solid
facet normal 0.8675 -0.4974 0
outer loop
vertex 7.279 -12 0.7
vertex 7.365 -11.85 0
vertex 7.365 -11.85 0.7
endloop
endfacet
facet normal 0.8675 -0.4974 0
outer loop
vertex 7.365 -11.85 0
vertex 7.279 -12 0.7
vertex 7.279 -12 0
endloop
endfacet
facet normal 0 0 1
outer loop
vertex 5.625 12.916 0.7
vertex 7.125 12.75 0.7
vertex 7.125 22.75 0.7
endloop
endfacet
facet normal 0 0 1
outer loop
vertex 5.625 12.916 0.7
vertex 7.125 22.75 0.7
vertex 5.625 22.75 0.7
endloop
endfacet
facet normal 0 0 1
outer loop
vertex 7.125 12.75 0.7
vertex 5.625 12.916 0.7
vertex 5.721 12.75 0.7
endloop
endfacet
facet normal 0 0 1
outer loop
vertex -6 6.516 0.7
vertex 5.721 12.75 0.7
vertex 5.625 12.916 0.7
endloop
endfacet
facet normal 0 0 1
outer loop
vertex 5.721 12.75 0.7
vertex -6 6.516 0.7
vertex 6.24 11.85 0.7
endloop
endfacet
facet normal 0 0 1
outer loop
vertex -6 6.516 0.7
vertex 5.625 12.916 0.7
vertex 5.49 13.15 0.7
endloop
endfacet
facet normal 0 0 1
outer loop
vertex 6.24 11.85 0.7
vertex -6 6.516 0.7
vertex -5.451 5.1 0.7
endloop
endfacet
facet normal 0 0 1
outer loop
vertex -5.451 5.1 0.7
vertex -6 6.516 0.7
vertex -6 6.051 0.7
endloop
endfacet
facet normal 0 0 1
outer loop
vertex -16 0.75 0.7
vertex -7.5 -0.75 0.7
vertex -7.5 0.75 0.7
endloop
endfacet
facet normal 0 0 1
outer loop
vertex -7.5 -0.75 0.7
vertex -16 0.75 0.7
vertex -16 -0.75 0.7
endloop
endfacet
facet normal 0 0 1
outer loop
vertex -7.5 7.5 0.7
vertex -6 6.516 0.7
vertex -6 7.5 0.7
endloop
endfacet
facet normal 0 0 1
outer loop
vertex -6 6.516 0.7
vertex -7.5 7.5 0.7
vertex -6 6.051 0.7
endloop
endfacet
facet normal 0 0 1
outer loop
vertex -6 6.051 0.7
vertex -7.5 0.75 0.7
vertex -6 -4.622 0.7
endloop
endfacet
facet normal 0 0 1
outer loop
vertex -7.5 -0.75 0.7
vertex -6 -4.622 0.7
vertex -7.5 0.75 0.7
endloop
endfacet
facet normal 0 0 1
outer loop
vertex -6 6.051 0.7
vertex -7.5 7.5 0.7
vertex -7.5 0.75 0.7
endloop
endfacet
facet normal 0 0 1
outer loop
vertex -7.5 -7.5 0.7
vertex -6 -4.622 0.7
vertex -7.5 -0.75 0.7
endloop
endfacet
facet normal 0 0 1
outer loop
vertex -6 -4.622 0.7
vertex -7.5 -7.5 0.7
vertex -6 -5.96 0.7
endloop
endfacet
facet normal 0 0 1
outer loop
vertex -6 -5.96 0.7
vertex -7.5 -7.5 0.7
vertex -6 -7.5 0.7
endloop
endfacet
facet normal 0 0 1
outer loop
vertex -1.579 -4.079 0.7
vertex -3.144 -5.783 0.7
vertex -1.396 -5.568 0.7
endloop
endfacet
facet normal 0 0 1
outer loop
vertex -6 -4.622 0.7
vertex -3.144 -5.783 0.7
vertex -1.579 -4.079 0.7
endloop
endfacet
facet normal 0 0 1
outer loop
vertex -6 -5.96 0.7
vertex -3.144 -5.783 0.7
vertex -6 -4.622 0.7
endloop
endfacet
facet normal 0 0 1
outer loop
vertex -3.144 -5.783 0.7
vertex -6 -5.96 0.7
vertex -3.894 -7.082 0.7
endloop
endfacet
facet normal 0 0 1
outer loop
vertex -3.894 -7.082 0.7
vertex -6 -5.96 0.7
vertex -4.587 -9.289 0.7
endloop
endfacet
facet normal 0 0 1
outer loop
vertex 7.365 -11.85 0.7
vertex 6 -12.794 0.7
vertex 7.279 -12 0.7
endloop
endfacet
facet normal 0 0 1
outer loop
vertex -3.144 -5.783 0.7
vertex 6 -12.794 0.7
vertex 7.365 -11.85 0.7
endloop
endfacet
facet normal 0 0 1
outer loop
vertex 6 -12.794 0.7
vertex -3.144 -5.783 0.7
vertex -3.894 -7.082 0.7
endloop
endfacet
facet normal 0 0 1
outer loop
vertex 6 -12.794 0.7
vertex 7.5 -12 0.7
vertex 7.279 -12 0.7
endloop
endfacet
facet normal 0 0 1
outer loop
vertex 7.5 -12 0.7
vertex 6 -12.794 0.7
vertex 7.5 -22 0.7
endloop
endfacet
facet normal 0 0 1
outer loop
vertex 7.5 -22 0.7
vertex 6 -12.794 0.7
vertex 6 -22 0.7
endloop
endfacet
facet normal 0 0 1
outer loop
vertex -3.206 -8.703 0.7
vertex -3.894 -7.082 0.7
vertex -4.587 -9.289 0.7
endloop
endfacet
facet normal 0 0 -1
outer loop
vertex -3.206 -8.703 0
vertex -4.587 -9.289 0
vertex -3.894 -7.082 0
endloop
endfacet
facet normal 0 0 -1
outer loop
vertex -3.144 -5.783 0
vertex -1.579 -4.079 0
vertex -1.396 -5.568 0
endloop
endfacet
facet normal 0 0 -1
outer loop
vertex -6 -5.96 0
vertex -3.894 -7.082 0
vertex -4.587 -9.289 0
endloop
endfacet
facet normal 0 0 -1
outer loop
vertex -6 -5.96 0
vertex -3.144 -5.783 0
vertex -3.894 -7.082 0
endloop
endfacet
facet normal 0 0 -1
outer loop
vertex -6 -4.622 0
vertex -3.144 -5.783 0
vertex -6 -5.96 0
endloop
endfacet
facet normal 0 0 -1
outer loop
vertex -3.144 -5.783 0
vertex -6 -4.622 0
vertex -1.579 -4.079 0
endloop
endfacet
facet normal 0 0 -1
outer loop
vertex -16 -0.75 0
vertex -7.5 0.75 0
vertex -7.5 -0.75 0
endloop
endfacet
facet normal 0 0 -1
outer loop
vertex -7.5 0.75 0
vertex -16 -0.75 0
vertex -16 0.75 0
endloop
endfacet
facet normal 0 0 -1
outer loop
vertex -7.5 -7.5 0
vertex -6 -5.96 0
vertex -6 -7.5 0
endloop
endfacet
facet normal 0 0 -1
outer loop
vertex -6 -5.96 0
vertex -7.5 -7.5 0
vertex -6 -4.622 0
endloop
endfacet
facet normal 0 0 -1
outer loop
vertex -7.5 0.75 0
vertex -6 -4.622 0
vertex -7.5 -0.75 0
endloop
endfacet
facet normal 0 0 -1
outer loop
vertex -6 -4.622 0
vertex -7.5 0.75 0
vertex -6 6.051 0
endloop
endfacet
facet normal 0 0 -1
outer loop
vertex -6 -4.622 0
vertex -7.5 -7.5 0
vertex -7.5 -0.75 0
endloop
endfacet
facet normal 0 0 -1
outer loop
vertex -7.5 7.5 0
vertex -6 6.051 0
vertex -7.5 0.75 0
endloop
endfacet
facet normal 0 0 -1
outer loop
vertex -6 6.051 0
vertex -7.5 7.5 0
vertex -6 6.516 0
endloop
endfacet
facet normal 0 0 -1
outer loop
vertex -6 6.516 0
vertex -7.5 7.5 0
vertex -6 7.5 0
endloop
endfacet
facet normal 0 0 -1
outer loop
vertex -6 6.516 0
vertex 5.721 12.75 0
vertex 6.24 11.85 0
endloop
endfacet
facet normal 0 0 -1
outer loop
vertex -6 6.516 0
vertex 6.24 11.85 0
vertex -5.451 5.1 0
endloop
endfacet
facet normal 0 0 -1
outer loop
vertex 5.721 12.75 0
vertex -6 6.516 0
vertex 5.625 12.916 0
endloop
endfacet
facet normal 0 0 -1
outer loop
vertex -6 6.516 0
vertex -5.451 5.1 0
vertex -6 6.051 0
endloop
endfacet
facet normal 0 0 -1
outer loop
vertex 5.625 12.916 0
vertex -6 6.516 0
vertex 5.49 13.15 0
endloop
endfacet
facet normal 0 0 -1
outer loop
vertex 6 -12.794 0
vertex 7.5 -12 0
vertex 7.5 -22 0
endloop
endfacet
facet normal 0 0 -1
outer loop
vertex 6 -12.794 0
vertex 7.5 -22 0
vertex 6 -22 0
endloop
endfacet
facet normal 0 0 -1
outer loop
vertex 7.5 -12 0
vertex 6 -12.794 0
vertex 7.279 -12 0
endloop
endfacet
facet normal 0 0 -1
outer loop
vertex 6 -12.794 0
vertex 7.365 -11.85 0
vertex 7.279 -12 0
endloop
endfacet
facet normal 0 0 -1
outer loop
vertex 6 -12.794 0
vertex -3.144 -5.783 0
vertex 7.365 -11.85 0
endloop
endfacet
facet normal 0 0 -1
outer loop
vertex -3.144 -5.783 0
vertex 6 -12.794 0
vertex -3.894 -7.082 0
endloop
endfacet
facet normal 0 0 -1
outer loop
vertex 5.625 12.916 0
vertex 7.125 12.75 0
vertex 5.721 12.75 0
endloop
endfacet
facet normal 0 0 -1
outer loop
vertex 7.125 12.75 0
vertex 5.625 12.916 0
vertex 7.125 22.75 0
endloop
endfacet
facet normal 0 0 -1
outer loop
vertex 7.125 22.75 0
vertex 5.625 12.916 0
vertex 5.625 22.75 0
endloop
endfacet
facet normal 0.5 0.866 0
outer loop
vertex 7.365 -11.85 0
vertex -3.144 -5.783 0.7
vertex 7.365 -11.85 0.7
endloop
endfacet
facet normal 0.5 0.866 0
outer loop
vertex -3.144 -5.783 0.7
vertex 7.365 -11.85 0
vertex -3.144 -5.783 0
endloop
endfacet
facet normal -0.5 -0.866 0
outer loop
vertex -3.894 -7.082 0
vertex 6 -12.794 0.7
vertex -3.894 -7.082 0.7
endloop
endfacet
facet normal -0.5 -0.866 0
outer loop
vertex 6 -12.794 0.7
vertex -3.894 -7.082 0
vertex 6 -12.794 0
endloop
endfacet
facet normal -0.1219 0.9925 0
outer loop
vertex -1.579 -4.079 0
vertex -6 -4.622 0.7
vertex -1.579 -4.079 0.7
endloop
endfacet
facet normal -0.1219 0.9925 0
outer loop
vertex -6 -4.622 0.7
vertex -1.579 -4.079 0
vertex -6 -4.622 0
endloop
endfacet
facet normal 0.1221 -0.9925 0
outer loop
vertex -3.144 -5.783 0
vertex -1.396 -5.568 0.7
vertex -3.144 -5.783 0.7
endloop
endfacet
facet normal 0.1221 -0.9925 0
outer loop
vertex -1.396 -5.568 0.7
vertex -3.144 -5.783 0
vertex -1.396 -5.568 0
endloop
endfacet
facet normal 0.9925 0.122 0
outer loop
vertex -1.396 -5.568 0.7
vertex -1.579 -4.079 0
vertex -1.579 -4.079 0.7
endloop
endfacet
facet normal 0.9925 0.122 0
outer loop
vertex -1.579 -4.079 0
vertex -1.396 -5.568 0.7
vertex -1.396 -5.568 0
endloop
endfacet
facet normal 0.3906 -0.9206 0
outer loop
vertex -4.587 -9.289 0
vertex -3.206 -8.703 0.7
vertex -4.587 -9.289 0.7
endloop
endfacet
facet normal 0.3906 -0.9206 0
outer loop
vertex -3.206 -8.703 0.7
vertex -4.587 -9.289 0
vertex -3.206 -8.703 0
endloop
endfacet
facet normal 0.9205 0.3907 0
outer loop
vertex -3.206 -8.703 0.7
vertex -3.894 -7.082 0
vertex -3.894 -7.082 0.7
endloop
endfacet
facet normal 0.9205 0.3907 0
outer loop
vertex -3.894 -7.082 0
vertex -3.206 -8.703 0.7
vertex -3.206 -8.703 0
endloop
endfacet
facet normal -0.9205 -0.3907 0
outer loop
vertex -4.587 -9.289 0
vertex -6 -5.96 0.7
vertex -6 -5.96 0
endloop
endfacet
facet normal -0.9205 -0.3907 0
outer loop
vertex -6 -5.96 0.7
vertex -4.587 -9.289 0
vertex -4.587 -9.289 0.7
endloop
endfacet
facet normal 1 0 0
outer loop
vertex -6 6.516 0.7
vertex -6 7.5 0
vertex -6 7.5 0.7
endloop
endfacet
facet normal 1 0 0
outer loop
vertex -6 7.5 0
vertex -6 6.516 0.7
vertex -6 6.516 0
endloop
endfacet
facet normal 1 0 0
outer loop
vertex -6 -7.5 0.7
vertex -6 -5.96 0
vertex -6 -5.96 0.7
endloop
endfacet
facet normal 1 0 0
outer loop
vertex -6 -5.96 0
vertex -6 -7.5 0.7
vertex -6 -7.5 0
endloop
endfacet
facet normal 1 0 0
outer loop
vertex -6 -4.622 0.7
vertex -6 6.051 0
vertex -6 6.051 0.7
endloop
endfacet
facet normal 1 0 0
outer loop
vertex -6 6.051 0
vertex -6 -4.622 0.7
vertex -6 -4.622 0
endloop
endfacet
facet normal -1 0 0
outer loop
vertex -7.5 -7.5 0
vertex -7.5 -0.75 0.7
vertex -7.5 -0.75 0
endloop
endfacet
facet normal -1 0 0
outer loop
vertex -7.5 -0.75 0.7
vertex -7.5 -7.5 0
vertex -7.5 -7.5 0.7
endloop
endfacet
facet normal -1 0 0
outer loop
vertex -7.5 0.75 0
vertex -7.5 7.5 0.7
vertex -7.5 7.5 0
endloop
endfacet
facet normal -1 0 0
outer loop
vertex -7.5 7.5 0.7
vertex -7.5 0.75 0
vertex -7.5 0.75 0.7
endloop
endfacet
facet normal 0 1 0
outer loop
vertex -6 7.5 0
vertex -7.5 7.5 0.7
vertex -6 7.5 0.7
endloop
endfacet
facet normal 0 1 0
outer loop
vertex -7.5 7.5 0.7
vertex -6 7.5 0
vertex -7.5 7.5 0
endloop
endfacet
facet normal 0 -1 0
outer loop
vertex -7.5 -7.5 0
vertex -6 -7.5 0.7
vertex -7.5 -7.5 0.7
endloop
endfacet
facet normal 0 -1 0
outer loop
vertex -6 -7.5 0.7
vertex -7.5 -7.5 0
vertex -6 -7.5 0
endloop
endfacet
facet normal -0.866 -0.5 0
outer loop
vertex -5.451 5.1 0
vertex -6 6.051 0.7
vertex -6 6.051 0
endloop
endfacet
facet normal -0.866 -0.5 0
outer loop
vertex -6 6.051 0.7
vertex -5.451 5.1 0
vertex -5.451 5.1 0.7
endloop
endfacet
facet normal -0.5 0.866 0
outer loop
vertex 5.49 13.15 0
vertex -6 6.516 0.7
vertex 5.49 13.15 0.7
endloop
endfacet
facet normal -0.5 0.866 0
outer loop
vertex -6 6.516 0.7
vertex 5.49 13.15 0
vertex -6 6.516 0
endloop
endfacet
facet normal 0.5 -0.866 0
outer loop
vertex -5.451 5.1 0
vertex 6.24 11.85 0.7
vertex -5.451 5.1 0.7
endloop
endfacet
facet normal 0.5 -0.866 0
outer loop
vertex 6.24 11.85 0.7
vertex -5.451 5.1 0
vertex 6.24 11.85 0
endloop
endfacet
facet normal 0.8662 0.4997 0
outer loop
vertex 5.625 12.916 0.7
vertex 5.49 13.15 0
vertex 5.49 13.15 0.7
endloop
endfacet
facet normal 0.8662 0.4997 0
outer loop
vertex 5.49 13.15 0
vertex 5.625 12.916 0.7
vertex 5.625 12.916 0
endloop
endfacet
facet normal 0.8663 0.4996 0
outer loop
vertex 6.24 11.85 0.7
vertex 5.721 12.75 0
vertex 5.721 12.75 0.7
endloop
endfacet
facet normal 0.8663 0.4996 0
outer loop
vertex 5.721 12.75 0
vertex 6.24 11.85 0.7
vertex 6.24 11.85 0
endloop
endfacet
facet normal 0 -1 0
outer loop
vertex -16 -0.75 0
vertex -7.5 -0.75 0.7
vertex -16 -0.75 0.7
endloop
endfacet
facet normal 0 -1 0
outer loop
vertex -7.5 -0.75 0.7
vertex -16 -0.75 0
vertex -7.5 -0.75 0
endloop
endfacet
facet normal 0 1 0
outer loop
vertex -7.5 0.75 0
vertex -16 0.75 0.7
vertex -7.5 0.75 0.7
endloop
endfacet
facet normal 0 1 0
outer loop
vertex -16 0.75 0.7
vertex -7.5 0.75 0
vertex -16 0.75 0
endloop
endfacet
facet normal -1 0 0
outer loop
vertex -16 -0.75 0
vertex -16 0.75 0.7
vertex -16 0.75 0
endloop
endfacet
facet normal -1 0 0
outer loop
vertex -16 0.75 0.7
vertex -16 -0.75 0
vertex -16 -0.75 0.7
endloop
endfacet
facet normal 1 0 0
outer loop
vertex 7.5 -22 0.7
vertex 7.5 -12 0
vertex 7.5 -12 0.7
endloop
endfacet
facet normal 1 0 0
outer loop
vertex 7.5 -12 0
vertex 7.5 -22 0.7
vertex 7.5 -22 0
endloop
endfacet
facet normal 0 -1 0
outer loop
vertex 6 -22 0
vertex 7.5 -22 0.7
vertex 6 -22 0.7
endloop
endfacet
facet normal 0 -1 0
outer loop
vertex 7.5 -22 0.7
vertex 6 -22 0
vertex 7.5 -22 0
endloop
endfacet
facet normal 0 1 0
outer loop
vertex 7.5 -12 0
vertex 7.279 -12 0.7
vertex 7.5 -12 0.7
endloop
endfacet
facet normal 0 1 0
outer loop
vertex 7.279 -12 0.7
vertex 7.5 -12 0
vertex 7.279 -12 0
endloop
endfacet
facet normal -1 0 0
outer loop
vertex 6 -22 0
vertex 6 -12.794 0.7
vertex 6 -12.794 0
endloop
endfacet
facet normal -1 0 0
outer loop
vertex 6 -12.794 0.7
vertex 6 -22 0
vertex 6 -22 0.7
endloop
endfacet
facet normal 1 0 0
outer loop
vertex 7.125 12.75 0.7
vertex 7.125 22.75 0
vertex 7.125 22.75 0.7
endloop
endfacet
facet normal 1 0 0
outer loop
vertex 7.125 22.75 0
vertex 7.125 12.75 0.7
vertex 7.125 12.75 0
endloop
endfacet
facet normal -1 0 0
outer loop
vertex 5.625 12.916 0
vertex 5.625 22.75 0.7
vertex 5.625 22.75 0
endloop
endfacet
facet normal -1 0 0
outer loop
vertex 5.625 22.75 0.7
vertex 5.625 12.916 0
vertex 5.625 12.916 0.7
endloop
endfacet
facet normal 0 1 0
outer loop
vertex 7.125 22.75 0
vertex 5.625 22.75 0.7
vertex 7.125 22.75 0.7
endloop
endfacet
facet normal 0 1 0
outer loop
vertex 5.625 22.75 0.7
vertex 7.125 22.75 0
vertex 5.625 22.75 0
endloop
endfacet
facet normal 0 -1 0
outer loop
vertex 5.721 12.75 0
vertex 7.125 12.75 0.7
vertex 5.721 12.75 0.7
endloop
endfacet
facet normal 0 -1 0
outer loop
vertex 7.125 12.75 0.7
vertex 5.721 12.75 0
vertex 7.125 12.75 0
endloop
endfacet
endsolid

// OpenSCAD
// file: sym_arrow.scad
module arrow(thickness, length, size, height)
{
    translate([thickness,-thickness/2])cube([length-thickness, thickness, height]);
    rotate([0,0,37])translate([0,-3*thickness/4])cube([size, thickness, height]);
    rotate([0,0,-37])translate([0,-thickness/4])cube([size, thickness, height]);
}
// file: sym_ring.scad
module ring(radius, thickness, height)
{
    difference()
    {
        cylinder(r=radius, h=height, $fn=64);
        translate([0,0,-thickness/2])cylinder(r=(radius-thickness), h=(height+thickness), $fn=64);
    }
}

ring(30, 1, 1);
// main file
use <sym_ring.scad>
use <sym_arrow.scad>
use <sym_ring.scad>

module transistor_pnp(diameter, thickness, height)
{
    //ring(0.5*diameter, thickness, height);
    
    //base
    translate([-diameter/4, -diameter/4, 0]) cube([thickness, diameter/2, height]);
    
    //emitter
    translate([-diameter/4+thickness, -diameter/6, 0])rotate([0,0,-30])arrow(thickness, diameter/2, 3*thickness, height);
    
    //collector
    //translate([1.6*diameter/8, diameter/2.5, 0])rotate([0,0,-150])arrow(thickness, 4*diameter/8, 0, height);
    translate([-diameter/4+thickness/4, diameter/6, 0])rotate([0,0, 30])arrow(thickness, 4*diameter/8, 0, height);
    
    //base wire
    translate([-diameter/4+thickness, 0,0]) rotate([0,0,180])arrow(thickness, diameter/3, 0, height);
    
    //emitter wire
    translate([diameter/4,-diameter/2+2*thickness,0])rotate([0,0,180])cube([thickness, diameter/3, height]);
    
    // collector wire
    translate([3*diameter/16, 1.5*diameter/4+thickness])cube([thickness, diameter/3, height]);
}

transistor_pnp(30, 1.5, 0.7);
